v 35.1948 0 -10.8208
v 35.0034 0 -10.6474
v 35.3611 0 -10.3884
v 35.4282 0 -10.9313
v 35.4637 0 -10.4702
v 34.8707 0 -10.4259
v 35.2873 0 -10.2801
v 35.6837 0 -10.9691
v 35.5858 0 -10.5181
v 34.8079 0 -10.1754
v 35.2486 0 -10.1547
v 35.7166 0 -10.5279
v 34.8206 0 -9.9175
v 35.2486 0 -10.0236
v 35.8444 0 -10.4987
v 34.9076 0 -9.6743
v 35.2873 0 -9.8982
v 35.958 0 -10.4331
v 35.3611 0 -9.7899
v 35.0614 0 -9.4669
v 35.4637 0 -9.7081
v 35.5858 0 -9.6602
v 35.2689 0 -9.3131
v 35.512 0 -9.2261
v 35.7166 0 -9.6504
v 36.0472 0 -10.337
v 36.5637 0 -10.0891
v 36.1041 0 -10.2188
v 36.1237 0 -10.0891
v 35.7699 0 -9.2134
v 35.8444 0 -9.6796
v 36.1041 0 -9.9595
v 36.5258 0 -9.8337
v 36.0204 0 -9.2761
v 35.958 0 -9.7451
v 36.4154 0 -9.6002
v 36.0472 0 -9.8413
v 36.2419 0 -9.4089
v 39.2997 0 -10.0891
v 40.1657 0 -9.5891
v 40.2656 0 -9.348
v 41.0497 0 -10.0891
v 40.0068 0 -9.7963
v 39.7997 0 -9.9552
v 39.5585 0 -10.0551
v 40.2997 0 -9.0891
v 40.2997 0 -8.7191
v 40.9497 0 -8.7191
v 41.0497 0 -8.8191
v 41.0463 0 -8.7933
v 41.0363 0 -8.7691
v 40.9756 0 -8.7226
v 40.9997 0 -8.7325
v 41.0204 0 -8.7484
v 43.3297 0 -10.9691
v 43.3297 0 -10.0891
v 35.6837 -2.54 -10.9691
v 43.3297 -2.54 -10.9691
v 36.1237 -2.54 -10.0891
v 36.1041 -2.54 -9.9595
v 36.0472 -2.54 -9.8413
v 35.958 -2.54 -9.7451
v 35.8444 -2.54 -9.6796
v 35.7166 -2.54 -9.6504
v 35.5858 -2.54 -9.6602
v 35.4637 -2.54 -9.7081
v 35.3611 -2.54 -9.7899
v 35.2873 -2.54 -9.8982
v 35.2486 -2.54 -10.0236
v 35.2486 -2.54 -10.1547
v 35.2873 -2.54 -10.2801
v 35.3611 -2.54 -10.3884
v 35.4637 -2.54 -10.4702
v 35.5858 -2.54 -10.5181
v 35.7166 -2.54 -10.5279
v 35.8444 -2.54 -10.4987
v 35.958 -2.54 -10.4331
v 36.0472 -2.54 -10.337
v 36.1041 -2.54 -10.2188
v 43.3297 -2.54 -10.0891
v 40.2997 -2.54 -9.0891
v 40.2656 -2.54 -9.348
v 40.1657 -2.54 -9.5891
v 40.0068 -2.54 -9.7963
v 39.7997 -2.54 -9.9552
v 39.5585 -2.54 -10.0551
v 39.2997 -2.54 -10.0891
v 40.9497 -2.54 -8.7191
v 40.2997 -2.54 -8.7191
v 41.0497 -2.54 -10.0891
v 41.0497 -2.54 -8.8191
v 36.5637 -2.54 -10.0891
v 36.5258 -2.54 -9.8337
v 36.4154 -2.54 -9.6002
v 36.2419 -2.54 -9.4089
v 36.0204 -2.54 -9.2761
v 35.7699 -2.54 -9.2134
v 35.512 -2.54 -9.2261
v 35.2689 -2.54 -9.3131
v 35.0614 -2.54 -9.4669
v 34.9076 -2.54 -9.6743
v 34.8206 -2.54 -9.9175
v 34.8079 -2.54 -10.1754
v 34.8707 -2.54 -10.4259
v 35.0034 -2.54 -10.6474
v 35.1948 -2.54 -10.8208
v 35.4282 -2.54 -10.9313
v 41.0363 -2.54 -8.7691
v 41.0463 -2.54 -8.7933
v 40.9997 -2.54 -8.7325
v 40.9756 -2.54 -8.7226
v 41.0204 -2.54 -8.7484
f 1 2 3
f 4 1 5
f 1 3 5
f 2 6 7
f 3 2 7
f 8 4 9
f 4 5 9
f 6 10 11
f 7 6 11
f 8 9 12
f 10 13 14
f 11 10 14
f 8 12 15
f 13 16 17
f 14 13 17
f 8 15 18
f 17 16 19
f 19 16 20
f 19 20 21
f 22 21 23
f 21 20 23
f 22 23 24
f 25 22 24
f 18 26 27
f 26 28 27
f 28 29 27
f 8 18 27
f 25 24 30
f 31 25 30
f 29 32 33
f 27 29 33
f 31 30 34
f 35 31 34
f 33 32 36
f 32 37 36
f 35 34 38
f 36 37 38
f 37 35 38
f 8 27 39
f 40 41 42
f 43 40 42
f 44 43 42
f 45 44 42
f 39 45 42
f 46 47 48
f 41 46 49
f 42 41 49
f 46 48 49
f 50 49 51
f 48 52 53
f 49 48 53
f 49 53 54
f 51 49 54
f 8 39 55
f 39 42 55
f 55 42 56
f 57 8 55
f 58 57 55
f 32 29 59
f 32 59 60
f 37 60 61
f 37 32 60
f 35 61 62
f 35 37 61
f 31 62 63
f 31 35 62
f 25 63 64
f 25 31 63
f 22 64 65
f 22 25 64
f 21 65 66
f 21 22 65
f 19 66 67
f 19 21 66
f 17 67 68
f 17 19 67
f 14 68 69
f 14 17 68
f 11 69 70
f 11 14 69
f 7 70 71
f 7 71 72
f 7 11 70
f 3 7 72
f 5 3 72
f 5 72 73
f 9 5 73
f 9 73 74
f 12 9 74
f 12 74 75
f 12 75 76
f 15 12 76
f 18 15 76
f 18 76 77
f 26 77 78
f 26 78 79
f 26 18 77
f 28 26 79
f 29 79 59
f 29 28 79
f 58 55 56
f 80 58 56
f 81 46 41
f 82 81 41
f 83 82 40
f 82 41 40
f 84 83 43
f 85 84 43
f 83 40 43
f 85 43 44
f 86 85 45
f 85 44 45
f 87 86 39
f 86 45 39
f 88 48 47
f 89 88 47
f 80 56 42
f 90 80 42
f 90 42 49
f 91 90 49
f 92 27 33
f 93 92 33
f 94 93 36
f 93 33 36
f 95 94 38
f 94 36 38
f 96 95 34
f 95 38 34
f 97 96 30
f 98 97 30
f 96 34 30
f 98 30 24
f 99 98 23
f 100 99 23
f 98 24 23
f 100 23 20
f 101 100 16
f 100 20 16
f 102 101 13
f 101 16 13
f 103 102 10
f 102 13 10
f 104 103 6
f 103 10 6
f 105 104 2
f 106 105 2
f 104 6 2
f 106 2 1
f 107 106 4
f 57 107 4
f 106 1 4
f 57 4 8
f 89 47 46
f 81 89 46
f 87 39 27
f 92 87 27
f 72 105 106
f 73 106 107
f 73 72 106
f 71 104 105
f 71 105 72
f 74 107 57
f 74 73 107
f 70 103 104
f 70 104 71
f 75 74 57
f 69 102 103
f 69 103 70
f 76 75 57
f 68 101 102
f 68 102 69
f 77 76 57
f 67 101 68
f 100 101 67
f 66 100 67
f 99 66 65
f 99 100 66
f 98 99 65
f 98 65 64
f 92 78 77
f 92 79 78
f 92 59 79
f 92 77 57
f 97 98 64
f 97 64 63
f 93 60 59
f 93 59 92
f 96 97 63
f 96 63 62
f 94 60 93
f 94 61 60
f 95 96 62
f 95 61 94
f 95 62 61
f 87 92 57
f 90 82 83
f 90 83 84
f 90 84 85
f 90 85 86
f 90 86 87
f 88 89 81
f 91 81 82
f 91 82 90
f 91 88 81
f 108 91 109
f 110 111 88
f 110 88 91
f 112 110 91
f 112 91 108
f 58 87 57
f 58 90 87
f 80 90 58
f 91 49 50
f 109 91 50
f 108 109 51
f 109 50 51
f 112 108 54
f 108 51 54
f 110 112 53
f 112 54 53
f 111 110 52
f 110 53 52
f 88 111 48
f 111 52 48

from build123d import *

# Parameters (mm, degrees)
F0_R     = 0.44
F1_DEPTH = 2.54


with BuildPart() as f1:
    # F0 (on Front) → F1 (new body)
    with BuildSketch(Plane.XZ):
        with BuildLine():
            Line((38.29968, -10.089144), (36.56368, -10.089144))
            ThreePointArc((36.56368, -10.089144), (35.061426, -9.46689), (35.68368, -10.969144))
            Line((35.68368, -10.969144), (40.29968, -10.969144))
            Line((40.29968, -10.969144), (43.32968, -10.969144))
            Line((43.32968, -10.969144), (43.32968, -10.089144))
            Line((43.32968, -10.089144), (41.04968, -10.089144))
            Line((41.04968, -10.089144), (41.04968, -8.919144))
            Line((41.04968, -8.919144), (41.04968, -8.819144))
            ThreePointArc((41.04968, -8.819144), (41.020391, -8.748433), (40.94968, -8.719144))
            Line((40.94968, -8.719144), (40.29968, -8.719144))
            Line((40.29968, -8.719144), (40.29968, -9.089144))
            ThreePointArc((40.29968, -9.089144), (40.006787, -9.79625), (39.29968, -10.089144))
            Line((39.29968, -10.089144), (38.29968, -10.089144))
        make_face()
        with Locations((35.68368, -10.089144)):
            Circle(F0_R, mode=Mode.SUBTRACT)
    extrude(amount=F1_DEPTH)


solid = f1.part
